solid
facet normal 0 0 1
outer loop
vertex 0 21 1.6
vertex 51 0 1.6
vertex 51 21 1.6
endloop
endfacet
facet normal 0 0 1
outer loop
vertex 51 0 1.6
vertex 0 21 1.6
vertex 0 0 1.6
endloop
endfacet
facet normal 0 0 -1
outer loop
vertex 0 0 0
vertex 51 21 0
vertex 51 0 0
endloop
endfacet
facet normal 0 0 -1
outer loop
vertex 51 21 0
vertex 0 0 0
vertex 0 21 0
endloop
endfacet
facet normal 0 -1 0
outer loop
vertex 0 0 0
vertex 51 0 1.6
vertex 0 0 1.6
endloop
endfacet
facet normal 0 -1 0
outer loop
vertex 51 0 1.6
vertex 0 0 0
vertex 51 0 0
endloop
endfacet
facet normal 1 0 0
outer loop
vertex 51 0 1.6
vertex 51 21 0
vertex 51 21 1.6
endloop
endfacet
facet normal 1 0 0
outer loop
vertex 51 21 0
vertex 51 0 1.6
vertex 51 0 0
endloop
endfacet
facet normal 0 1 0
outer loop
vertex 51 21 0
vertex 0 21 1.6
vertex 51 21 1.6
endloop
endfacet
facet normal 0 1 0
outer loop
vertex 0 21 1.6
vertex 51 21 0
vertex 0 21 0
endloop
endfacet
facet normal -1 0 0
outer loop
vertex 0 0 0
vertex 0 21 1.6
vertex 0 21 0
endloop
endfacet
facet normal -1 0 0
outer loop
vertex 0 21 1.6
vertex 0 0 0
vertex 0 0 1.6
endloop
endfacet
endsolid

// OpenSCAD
$fn = 64;

board_x = 51.0;
board_y = 21.0;
board_z = 1.6;

color([0.05, 0.45, 0.15])
cube([board_x, board_y, board_z], center=false);
